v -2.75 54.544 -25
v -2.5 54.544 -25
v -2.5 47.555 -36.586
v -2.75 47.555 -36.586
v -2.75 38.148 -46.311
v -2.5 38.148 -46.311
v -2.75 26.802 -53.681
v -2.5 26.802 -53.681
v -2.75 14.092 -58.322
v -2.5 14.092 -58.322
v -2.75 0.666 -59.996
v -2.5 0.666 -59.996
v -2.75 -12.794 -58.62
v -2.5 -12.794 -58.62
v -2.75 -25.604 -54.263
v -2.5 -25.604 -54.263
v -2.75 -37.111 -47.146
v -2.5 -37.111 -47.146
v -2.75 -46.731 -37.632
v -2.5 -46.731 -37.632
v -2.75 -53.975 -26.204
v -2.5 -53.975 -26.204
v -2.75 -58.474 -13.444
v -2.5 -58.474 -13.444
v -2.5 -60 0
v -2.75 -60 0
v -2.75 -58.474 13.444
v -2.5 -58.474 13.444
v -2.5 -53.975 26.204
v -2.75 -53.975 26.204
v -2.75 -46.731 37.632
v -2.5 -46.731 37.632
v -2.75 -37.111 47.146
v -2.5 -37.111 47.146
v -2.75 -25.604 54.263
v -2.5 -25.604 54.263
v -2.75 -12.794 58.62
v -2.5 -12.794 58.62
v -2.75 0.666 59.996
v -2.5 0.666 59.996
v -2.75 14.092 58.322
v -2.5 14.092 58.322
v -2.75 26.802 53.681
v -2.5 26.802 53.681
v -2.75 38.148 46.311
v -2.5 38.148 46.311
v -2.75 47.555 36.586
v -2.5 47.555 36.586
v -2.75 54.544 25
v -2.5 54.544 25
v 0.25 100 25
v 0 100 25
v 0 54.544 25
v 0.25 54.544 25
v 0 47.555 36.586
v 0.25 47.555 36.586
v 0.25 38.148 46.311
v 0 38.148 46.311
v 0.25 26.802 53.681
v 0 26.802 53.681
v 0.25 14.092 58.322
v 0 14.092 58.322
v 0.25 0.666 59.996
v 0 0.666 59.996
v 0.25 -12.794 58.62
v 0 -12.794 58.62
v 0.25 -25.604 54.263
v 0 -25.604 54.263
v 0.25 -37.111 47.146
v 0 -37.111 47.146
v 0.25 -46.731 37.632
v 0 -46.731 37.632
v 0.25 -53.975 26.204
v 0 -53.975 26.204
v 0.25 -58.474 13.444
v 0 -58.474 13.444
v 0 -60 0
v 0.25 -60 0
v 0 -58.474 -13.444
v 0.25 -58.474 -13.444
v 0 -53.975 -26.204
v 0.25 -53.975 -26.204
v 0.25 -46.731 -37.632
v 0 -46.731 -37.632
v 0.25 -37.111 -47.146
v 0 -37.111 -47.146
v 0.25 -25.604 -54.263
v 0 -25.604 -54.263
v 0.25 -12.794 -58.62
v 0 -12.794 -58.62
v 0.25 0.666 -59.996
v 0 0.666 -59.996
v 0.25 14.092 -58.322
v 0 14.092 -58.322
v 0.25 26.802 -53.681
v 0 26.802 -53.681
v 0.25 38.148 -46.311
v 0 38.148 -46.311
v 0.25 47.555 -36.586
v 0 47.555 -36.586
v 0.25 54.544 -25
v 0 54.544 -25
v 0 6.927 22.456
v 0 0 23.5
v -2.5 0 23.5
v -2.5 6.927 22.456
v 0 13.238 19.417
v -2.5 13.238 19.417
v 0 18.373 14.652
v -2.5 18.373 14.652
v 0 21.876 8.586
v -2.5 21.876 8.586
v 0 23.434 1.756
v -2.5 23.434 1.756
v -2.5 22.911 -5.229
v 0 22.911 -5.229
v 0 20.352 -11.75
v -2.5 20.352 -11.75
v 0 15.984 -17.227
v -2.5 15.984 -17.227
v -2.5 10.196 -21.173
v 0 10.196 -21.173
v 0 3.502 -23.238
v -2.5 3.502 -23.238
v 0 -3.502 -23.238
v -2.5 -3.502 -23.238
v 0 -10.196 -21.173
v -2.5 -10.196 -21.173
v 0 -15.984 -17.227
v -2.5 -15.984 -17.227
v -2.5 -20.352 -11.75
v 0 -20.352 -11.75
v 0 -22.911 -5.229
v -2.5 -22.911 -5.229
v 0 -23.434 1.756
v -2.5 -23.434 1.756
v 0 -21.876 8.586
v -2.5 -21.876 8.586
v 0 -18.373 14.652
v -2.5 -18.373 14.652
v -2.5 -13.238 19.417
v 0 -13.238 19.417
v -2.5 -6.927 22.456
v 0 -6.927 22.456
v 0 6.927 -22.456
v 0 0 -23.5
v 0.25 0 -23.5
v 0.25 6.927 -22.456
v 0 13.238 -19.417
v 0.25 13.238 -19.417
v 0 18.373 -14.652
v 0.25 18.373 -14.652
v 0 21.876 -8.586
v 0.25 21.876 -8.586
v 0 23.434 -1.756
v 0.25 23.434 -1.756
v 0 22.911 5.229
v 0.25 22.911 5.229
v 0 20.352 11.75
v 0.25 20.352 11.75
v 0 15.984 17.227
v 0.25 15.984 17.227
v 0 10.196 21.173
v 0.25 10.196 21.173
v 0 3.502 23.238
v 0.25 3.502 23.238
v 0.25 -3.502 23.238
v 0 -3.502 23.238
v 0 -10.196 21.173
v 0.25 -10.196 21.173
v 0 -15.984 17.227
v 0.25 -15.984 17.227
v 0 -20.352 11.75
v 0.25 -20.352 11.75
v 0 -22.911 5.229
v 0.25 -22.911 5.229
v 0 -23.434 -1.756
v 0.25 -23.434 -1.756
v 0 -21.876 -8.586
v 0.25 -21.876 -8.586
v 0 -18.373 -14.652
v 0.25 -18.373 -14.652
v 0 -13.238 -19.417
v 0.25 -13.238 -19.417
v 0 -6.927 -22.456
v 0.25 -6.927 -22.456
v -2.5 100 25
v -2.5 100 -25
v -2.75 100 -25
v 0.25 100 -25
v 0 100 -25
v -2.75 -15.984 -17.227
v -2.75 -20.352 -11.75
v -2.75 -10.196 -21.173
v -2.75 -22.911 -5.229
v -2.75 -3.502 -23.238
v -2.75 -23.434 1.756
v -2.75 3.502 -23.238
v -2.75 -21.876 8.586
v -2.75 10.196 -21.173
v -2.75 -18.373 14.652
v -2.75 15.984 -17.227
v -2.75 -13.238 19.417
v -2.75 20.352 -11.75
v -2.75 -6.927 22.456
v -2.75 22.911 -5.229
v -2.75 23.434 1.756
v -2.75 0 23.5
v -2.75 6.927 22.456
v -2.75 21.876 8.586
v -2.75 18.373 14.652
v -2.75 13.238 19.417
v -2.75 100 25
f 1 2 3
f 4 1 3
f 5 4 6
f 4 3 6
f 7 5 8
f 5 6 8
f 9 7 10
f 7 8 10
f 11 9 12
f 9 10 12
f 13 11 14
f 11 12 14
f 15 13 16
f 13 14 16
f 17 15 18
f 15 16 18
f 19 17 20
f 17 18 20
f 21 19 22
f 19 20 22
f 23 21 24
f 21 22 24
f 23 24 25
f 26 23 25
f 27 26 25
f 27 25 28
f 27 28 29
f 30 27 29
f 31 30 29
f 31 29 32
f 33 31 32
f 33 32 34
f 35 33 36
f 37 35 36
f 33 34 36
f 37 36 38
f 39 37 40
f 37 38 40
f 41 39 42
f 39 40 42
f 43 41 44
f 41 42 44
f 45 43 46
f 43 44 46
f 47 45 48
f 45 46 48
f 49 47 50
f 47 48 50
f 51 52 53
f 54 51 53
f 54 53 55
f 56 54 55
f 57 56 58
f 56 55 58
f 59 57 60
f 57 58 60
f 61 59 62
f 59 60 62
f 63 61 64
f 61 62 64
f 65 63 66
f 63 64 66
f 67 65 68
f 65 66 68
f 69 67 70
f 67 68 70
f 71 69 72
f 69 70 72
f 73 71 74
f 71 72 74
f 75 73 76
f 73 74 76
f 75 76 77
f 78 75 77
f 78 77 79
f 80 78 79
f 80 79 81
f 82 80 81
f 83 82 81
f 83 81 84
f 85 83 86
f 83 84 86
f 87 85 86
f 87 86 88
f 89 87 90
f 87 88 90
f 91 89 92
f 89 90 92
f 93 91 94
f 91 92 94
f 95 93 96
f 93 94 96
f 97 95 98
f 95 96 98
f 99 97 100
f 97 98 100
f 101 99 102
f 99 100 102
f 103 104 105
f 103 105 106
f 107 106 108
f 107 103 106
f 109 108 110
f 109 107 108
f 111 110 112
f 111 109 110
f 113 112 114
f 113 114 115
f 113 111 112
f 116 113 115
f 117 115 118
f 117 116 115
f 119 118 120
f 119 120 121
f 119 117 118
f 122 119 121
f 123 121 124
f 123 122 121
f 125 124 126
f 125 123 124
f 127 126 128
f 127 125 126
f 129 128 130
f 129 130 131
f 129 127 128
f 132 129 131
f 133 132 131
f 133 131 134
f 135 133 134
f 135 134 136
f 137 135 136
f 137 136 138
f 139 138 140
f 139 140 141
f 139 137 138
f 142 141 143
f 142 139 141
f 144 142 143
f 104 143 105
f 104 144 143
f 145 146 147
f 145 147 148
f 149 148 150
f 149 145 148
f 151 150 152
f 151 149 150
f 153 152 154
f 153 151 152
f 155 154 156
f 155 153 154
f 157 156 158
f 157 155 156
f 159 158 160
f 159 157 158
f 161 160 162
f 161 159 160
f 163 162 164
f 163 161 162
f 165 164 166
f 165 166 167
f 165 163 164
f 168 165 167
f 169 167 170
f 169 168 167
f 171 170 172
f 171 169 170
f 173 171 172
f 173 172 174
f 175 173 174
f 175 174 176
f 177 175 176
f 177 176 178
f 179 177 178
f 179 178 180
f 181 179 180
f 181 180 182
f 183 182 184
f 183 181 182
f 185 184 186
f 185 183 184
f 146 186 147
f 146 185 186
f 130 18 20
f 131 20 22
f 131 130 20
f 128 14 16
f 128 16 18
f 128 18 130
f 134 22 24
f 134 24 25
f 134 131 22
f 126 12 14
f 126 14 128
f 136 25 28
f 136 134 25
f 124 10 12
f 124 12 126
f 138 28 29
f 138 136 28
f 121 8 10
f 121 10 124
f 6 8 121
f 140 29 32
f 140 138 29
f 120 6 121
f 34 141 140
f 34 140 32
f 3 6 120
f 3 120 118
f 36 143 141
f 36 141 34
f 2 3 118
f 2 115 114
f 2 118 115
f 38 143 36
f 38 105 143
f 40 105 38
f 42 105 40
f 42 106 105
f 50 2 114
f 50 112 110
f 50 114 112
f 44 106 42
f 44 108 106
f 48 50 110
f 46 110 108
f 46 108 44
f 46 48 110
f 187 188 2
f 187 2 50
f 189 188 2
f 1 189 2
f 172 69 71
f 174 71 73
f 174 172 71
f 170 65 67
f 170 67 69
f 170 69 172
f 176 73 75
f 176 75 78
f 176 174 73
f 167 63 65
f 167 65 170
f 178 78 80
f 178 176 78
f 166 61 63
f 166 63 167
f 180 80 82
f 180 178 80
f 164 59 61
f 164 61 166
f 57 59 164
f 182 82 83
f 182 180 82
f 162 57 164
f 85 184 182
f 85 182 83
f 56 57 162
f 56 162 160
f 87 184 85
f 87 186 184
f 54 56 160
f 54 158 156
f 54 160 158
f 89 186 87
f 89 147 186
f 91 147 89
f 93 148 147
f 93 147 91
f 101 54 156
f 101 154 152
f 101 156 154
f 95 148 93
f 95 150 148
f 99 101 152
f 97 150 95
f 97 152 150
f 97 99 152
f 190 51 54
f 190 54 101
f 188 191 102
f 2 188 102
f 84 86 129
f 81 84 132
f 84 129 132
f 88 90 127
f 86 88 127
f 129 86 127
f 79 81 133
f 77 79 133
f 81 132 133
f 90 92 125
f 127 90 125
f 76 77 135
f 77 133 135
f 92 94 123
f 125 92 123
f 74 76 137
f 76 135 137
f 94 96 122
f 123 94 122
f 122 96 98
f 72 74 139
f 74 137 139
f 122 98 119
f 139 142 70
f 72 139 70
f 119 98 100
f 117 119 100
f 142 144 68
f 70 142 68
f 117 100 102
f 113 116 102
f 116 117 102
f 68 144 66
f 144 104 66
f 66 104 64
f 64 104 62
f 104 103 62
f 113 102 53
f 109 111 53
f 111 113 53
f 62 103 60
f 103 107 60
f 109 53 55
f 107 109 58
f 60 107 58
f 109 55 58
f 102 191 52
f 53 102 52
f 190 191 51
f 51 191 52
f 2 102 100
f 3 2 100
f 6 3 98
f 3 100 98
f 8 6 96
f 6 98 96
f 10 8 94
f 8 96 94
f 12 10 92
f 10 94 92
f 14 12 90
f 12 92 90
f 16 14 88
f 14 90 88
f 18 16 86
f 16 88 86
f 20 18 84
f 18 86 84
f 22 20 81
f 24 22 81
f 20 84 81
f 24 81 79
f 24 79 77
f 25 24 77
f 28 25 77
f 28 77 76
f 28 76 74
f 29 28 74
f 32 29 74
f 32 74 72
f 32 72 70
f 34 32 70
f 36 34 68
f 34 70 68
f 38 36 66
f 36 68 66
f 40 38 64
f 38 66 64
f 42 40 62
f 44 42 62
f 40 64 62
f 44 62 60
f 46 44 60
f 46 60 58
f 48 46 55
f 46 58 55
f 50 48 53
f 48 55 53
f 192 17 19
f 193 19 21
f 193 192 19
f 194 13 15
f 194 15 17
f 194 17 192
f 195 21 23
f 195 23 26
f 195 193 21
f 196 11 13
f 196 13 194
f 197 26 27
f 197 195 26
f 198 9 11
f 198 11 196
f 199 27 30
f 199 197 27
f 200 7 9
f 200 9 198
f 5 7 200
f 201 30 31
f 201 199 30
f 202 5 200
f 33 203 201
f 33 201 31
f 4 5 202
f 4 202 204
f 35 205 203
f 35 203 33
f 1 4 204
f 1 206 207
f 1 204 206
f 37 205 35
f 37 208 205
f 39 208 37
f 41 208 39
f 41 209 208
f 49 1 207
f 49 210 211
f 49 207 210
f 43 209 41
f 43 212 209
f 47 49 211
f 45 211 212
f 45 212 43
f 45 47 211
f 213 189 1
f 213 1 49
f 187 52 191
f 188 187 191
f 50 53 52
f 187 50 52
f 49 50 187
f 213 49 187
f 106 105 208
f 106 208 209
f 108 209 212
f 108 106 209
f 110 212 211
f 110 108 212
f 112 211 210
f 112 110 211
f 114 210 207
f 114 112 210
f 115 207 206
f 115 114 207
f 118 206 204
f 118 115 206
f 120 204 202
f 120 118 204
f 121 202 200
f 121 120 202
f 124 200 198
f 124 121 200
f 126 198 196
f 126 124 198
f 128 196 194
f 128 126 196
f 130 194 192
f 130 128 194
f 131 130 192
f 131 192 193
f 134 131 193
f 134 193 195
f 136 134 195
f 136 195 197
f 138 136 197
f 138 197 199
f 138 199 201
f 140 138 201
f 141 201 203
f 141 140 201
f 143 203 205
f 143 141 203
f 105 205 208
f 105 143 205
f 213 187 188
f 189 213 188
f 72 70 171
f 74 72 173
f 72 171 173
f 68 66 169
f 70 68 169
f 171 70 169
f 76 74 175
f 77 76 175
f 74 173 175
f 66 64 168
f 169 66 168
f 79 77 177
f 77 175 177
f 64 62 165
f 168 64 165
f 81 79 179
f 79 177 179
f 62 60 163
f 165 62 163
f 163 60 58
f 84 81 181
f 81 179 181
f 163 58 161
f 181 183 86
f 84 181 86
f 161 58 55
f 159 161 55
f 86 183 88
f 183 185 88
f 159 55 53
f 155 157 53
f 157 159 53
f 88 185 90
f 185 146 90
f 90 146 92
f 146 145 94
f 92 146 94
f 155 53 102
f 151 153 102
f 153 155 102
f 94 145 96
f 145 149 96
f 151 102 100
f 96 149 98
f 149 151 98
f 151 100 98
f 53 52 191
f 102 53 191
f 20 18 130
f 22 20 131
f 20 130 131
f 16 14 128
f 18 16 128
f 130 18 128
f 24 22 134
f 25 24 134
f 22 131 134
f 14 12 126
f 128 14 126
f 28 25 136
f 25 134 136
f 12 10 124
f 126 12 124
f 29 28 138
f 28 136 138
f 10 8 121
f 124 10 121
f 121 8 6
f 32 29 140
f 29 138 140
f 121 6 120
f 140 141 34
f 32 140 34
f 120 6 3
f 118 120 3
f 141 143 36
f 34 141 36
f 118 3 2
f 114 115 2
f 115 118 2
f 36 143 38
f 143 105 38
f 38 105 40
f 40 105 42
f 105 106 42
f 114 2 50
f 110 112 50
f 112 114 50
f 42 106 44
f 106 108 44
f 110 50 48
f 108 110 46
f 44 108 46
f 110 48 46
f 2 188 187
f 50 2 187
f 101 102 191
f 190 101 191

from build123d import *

# Parameters (mm, degrees)
SKETCH1_R           = 60
SKETCH1_R_2         = 23.5
BOSS_EXTRUDE1_DEPTH = 0.25
SKETCH4_R           = 23.5
BOSS_EXTRUDE4_DEPTH = 2.5
SKETCH5_R           = 23.5
BOSS_EXTRUDE5_DEPTH = 0.25


with BuildPart() as part:
    # Sketch1 → Boss-Extrude1 (new body)
    with BuildSketch(Plane(origin=(0, 0, 0), x_dir=(0, 0, -1), z_dir=(1, 0, 0))):
        with BuildLine():
            Line((25, 100), (-25, 100))
            Line((-25, 100), (-25, 54.543560573))
            ThreePointArc((-25, 54.543560573), (0, 60), (25, 54.543560573))
            Line((25, 54.543560573), (25, 100))
        make_face()
        Circle(SKETCH1_R)
        Circle(SKETCH1_R_2, mode=Mode.SUBTRACT)
    extrude(amount=BOSS_EXTRUDE1_DEPTH)


with BuildPart() as body_2:
    # Sketch4 → Boss-Extrude4 (new body)
    with BuildSketch(Plane.ZY):
        with BuildLine():
            Line((25, 54.543560573), (25, 100))
            Line((25, 100), (-25, 100))
            Line((-25, 100), (-25, 54.543560573))
            ThreePointArc((-25, 54.543560573), (0, -60), (25, 54.543560573))
        make_face()
        Circle(SKETCH4_R, mode=Mode.SUBTRACT)
    extrude(amount=BOSS_EXTRUDE4_DEPTH)


with BuildPart() as body_3:
    # Sketch5 → Boss-Extrude5 (new body)
    with BuildSketch(Plane.ZY.offset(2.5)):
        with BuildLine():
            Line((25, 54.543560573), (25, 100))
            Line((25, 100), (-25, 100))
            Line((-25, 100), (-25, 54.543560573))
            ThreePointArc((-25, 54.543560573), (0, -60), (25, 54.543560573))
        make_face()
        Circle(SKETCH5_R, mode=Mode.SUBTRACT)
    extrude(amount=BOSS_EXTRUDE5_DEPTH)


solid = Compound([part.part, body_2.part, body_3.part])
